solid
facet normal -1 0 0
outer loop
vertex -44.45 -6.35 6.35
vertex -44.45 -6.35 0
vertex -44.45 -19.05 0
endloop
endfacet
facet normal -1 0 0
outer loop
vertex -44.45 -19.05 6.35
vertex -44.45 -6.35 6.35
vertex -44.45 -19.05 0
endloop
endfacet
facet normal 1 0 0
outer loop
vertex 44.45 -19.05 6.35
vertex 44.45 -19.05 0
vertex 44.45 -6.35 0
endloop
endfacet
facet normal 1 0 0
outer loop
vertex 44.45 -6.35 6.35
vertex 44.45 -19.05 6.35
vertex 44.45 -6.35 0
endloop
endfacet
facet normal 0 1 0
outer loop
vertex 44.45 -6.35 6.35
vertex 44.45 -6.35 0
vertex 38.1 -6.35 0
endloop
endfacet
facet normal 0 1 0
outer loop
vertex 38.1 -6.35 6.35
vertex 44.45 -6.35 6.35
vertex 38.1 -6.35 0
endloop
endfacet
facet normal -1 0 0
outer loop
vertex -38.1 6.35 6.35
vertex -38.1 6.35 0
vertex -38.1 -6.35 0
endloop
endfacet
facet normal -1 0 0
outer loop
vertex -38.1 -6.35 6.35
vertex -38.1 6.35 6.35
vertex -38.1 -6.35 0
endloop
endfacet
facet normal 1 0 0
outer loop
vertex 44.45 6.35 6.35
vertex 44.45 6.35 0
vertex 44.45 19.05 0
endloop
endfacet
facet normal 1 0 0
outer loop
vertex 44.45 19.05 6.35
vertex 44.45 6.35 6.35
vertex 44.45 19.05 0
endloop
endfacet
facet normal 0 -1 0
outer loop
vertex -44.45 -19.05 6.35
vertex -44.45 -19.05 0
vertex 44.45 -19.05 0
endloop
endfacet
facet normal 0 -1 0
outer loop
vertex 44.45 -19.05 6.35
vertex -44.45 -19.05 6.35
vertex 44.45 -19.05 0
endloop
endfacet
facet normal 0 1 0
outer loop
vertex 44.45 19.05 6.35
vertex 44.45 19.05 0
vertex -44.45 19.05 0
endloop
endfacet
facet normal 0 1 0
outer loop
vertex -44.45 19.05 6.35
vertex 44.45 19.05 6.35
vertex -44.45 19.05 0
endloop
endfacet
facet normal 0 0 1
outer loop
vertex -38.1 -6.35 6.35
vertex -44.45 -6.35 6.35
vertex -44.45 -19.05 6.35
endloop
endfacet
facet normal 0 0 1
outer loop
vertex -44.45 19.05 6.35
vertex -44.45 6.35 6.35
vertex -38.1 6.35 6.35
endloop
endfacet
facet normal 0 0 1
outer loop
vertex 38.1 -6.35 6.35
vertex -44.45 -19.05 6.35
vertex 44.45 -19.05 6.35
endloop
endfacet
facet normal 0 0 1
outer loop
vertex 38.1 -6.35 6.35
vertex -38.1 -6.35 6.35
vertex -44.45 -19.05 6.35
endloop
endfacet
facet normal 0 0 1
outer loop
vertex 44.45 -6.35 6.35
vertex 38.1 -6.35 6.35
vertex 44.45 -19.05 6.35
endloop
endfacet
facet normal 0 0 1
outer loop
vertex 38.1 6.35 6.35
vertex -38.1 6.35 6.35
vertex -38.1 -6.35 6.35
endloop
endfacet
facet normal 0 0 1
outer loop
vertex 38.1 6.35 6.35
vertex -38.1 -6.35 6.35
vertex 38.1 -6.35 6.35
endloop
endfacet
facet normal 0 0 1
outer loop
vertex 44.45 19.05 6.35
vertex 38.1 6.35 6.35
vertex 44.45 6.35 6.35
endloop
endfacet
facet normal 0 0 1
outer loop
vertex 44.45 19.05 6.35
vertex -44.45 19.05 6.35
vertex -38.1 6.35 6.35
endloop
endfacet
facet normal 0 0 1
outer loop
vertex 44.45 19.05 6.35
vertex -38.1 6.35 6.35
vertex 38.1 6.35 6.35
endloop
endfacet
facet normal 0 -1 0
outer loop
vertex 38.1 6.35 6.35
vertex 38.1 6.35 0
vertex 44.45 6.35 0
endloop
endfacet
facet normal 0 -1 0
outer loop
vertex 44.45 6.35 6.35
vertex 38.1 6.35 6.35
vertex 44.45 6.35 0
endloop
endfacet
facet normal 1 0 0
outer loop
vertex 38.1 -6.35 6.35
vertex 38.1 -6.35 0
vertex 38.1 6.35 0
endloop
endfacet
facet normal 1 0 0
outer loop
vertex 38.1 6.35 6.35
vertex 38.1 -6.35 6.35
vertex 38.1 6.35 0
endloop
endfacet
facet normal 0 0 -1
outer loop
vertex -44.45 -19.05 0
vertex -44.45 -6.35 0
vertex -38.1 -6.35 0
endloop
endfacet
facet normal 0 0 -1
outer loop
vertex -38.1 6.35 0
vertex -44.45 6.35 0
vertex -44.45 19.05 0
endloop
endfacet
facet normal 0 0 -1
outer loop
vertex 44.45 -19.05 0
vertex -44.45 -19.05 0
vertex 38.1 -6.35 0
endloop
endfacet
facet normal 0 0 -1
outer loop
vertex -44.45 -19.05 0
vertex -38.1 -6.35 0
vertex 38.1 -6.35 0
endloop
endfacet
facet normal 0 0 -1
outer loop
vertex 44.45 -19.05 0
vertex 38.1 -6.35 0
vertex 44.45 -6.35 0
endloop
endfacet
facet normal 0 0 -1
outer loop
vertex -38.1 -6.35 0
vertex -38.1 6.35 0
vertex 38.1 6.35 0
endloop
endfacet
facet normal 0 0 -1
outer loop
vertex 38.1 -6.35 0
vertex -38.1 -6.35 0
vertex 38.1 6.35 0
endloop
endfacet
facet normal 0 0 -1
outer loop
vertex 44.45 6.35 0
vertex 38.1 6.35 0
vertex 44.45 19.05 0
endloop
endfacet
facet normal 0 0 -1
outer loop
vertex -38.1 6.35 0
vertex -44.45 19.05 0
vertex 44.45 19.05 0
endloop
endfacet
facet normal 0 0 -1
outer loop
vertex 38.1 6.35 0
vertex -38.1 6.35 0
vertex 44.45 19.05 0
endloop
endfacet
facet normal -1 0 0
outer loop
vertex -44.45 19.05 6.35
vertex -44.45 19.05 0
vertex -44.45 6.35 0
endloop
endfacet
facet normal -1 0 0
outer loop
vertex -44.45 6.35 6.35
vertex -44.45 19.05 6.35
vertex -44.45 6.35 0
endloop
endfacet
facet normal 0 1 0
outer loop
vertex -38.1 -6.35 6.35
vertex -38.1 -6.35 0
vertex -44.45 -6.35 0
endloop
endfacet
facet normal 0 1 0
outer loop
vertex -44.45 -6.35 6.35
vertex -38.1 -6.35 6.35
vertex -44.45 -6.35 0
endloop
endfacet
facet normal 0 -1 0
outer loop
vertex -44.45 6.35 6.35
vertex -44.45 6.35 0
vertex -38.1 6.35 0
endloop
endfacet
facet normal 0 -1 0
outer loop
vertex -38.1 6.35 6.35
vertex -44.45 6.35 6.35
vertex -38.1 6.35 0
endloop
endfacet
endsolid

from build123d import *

# Parameters (mm, degrees)
F1_DEPTH = 6.35


# Not quite as in the source:
# - a feature names something its author has since deleted; it is built from what else it names


with BuildPart() as f1:
    # F0 (on Top) → F1 (new body)
    with BuildSketch(Plane.XY):
        Polygon((44.45, 19.05), (38.1, 19.05), (-38.1, 19.05), (-44.45, 19.05), (-44.45, 6.35), (-38.1, 6.35), (-38.1, -6.35), (-44.45, -6.35), (-44.45, -19.05), (-38.1, -19.05), (38.1, -19.05), (44.45, -19.05), (44.45, -6.35), (38.1, -6.35), (38.1, 6.35), (44.45, 6.35), align=None)
    extrude(amount=F1_DEPTH)


solid = f1.part
